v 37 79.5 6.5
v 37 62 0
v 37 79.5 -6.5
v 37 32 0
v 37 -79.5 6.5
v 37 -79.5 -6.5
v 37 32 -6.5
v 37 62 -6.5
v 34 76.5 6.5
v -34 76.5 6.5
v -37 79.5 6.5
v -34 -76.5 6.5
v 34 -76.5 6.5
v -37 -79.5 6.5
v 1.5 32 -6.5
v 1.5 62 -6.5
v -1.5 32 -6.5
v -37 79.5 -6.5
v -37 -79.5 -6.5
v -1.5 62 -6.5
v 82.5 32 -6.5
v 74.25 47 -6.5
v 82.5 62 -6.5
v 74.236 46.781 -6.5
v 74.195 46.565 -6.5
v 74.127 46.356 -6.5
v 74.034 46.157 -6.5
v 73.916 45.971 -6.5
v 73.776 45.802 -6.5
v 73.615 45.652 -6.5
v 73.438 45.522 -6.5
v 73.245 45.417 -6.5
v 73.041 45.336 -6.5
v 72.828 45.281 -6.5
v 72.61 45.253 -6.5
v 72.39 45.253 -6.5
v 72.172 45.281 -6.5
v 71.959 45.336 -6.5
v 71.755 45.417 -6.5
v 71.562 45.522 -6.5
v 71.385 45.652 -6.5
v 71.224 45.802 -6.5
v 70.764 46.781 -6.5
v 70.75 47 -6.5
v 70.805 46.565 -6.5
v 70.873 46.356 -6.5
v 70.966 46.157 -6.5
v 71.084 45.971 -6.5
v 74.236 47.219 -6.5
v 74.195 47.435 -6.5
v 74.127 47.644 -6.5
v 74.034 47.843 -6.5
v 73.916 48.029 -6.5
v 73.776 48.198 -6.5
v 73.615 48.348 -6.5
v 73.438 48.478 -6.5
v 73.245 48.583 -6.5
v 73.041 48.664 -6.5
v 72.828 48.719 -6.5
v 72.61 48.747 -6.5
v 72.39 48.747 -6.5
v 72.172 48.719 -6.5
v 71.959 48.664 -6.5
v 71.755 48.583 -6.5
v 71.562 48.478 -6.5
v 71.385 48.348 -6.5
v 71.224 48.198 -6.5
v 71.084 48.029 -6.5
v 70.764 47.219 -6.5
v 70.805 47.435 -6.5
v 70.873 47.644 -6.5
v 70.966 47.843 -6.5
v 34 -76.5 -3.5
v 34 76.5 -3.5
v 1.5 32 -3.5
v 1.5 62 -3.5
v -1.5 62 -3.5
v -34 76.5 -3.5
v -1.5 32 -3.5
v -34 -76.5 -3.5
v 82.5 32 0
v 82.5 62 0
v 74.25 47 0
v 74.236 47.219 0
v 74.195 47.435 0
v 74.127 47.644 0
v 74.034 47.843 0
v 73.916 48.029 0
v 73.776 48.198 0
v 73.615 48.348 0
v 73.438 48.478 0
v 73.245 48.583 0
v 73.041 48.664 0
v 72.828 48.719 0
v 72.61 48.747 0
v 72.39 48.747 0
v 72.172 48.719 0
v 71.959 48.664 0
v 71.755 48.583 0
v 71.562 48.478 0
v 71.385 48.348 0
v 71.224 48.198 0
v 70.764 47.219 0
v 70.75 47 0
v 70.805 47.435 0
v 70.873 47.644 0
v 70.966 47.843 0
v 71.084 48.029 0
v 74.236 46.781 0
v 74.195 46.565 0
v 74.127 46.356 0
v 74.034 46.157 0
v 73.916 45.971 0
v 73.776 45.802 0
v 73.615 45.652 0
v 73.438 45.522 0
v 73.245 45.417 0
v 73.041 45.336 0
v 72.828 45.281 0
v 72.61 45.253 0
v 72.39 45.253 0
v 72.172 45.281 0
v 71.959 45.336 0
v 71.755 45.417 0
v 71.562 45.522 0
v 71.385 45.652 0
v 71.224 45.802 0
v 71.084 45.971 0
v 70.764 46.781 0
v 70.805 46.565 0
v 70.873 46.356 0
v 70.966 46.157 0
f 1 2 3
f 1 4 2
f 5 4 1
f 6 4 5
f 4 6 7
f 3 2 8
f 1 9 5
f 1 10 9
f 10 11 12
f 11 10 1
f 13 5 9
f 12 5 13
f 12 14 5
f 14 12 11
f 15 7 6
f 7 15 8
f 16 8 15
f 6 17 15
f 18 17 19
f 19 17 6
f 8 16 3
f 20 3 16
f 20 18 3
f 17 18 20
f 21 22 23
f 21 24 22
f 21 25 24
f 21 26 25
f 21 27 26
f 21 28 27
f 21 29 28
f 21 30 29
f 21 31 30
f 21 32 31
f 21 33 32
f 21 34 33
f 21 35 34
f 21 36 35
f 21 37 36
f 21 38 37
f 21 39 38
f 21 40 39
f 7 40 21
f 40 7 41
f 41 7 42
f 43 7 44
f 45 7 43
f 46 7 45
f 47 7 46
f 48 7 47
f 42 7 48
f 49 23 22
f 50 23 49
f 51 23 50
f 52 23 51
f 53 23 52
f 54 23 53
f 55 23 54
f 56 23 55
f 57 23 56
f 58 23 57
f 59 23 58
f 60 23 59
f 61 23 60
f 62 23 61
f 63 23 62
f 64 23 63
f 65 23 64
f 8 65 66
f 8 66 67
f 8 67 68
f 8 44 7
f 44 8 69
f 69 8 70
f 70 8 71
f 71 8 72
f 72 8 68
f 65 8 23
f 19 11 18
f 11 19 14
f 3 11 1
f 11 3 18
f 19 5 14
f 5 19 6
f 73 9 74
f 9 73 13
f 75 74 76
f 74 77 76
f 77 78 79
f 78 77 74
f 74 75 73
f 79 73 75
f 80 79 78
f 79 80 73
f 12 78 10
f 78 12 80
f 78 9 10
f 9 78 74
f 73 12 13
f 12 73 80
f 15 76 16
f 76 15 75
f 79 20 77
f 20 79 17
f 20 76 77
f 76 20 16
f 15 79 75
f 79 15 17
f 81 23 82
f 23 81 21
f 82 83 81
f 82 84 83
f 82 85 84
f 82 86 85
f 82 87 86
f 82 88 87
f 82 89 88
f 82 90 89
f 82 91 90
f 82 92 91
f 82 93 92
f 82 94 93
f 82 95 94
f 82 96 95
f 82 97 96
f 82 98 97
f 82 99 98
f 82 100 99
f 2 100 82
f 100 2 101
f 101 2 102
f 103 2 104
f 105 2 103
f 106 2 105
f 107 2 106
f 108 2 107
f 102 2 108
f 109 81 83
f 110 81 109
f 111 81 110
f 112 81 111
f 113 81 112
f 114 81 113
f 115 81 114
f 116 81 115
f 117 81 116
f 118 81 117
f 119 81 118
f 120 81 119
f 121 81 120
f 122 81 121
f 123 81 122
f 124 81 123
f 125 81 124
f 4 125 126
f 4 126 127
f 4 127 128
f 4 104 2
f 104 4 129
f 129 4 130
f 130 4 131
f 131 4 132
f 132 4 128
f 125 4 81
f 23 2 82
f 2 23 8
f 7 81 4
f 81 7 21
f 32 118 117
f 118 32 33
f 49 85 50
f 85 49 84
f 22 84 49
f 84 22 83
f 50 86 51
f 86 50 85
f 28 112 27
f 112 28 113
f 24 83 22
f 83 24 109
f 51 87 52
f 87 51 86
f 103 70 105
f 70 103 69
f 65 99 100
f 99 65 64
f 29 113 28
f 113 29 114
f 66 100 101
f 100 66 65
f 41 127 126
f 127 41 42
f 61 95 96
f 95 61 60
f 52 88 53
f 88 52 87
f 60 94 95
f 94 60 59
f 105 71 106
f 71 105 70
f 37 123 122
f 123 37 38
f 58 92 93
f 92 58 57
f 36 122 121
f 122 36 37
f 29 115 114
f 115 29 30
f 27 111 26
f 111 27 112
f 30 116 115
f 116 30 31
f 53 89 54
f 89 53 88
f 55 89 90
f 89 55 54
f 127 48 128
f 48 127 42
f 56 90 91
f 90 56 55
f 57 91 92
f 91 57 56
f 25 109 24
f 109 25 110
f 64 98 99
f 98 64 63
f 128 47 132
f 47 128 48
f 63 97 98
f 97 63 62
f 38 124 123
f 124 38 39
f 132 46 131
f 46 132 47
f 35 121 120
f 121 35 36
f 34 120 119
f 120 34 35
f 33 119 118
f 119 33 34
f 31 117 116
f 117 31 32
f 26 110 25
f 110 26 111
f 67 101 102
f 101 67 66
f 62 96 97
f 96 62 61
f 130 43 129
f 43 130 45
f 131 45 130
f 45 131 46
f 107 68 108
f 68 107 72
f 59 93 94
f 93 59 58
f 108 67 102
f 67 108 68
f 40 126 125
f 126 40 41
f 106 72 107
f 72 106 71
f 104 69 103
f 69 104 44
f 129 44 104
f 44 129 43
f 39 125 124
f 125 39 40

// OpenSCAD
FootWidth = 67.0 + 1;
FootLength = 152 + 1;
FootWalls = 10;
WallWidth = 3;

CutterWidth = 3;
CutterLength = 30;
CutterOffset = 47;
HoleRadius = 145 / 2;
difference()
{
    foot();
    cutter();
}

difference()
{
    arm();
    pivot_hole();
}

module pivot_hole()
{
    translate([HoleRadius,CutterOffset,0]){
        cylinder(h=100,d=3.5,center=true,$fn=50);
    }
}

module arm()
{
    depth = (FootWalls + WallWidth);
    ArmWidth = 30 ;
    ArmLength = HoleRadius + 10 -(FootWidth + WallWidth * 2) / 2;
    translate([FootWidth / 2 + WallWidth,
                CutterOffset - ArmWidth / 2,
                -depth / 2]){
        cube([ArmLength,ArmWidth,depth * 0.5]);
    }
}


module cutter(){
    translate([0,CutterOffset,0]){
    cube([CutterWidth,CutterLength,FootWalls*2],true);
    }
}

module foot() {
difference() {
    cube([FootWidth + WallWidth * 2, FootLength + WallWidth * 2, WallWidth + FootWalls],true);

        translate([0,0,WallWidth]){
            cube([FootWidth, FootLength, WallWidth + FootWalls], true);
        }
    }
}
